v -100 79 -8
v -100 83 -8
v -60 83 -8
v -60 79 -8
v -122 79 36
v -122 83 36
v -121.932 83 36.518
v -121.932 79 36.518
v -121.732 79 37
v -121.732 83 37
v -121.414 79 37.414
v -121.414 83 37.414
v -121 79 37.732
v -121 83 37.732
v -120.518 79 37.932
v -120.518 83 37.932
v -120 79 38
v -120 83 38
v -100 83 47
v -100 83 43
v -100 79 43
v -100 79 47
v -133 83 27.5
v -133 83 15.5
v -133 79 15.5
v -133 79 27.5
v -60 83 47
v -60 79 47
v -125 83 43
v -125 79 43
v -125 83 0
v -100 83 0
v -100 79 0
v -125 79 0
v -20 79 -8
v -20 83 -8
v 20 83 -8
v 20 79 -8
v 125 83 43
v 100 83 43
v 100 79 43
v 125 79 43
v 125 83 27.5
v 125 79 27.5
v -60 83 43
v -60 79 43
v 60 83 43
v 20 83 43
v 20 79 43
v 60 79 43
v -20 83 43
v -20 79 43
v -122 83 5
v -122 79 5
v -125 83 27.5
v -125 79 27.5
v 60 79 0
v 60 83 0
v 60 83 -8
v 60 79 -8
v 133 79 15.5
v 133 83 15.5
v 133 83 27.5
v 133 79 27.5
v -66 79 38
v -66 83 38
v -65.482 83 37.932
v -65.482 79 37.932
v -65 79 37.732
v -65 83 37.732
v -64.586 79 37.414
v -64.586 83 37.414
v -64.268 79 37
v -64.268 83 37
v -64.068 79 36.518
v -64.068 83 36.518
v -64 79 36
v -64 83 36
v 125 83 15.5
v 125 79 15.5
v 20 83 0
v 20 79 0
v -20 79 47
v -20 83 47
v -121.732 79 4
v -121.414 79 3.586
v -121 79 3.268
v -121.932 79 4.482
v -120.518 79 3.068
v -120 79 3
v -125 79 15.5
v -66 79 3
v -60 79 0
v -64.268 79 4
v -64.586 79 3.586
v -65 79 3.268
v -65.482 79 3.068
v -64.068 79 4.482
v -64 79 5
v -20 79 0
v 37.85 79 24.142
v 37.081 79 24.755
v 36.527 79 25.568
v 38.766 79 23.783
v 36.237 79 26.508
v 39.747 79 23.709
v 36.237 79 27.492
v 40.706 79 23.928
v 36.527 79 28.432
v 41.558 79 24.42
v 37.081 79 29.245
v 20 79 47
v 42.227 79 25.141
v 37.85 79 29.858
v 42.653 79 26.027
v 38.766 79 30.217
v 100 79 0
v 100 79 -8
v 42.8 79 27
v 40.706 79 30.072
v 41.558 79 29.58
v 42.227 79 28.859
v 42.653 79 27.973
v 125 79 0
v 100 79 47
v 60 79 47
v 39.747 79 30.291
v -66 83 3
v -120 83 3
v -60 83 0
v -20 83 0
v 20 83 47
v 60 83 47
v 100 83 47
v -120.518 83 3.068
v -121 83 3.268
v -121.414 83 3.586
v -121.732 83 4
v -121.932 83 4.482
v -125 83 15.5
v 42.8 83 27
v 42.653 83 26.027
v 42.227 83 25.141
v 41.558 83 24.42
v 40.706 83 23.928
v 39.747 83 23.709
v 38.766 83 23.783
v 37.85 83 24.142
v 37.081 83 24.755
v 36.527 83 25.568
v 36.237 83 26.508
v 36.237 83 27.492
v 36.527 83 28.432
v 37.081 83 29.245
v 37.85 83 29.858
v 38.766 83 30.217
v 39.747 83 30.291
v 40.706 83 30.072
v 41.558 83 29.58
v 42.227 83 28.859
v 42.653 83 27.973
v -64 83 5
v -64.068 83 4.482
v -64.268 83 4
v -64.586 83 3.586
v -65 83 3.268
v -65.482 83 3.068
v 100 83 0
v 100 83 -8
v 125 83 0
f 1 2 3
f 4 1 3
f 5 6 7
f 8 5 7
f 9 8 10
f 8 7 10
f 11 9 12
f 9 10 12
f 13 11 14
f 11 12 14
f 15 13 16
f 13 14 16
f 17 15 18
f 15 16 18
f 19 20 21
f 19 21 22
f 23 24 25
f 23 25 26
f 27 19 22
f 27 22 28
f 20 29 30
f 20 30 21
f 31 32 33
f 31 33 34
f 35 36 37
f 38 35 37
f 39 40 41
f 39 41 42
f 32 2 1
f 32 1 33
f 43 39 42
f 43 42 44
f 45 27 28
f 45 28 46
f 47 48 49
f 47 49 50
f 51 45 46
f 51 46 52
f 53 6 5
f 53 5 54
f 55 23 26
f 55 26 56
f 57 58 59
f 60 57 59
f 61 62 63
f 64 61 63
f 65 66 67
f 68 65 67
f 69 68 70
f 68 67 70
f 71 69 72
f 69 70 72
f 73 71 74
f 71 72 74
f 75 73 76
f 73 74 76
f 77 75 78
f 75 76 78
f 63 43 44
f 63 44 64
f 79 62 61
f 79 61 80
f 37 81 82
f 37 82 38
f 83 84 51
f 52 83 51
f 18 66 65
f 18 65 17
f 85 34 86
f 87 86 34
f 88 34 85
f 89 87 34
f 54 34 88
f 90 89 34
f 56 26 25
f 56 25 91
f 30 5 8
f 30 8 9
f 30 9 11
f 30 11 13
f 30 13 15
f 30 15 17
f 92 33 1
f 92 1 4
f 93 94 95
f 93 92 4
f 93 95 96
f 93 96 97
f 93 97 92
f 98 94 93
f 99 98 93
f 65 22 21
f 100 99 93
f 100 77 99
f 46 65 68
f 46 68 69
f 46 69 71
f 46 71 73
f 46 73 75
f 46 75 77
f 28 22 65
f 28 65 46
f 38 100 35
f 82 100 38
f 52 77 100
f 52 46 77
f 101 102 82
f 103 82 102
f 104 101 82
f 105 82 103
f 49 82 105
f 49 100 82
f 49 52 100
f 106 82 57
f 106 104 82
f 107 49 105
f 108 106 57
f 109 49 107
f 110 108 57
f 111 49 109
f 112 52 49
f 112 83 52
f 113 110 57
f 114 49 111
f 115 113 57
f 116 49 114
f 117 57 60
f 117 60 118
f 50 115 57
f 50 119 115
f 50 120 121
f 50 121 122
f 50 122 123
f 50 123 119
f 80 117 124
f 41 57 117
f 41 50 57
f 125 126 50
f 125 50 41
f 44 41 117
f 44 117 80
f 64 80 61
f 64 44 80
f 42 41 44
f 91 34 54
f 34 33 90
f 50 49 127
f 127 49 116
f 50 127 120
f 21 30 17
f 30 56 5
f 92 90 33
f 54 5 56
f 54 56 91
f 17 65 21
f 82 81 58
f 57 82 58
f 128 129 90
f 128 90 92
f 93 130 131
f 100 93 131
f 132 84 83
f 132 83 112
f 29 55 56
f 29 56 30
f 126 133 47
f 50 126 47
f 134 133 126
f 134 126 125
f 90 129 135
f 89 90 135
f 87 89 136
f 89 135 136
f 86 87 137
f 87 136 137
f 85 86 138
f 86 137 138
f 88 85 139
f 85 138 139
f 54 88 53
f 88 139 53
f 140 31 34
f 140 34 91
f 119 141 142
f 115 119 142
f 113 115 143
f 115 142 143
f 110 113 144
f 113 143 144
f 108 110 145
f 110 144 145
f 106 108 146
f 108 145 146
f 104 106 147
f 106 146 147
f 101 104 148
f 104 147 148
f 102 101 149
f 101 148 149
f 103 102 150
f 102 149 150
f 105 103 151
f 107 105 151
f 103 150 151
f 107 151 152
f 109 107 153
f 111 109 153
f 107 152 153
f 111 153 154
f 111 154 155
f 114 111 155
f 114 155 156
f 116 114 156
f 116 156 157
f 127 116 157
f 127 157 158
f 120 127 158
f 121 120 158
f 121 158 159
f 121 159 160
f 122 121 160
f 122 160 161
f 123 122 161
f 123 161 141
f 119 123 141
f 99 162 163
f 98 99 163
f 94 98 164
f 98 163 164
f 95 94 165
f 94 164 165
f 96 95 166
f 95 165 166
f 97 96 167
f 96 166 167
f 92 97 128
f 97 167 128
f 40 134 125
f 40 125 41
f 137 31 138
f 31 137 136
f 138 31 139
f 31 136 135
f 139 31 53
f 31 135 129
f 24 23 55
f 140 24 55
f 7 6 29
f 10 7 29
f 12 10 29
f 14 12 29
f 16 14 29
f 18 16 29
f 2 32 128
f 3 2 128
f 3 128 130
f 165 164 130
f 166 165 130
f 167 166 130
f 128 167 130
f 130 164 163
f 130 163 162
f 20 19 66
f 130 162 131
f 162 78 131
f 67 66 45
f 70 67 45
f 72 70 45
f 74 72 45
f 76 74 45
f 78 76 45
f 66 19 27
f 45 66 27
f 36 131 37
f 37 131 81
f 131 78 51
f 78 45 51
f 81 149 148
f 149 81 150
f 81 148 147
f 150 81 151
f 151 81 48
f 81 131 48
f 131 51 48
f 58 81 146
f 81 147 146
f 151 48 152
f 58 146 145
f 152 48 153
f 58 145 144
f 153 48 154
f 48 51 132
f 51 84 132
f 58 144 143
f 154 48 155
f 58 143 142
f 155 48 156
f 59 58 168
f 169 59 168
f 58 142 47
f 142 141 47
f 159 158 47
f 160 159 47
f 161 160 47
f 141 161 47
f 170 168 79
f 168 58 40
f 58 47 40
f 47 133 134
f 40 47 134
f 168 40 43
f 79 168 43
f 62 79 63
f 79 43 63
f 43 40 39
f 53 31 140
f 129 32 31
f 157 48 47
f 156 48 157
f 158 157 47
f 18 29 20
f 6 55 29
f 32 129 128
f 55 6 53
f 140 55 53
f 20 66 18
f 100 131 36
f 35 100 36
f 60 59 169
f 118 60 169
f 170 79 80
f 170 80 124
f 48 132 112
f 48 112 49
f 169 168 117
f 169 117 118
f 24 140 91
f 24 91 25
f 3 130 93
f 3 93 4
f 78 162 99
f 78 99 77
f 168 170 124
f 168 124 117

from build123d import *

# Parameters (mm, degrees)
SKETCH005_W     = 266
SKETCH005_H     = 55
PAD002_DEPTH    = 4
SKETCH023_W     = 40
SKETCH023_H     = 30
POCKET006_DEPTH = 4.001
POCKET013_DEPTH = 4.001
SKETCH039_R     = 3.3
HOLE004_DEPTH   = 4.001


with BuildPart() as part:
    # Sketch005 (on DatumPlane) → Pad002 (new body)
    with BuildSketch(Plane.XZ.offset(-83)):
        with Locations((0, 19.5)):
            Rectangle(SKETCH005_W, SKETCH005_H)
    extrude(amount=PAD002_DEPTH)

    # Sketch023 (on Face5 of Pad002) → Pocket006 (cut, through all)
    with BuildSketch(Plane(origin=(0, 83, 0), x_dir=(1, 0, 0), z_dir=(0, 1, 0))):
        Polygon((-145, 30), (-100, 30), (-100, 0), (-125, 0), (-125, -15.5), (-155, -15.5), (-155, 4.5), (-145, 4.5), align=None)
        with Locations((-40, 15)):
            Rectangle(SKETCH023_W, SKETCH023_H)
        with Locations((40, 15)):
            Rectangle(SKETCH023_W, SKETCH023_H)
        Polygon((100, 30), (145, 30), (145, 4.5), (155, 4.5), (155, -15.5), (125, -15.5), (125, 0), (100, 0), align=None)
        Polygon((-125, -43), (-100, -43), (-100, -73), (-145, -73), (-145, -47.5), (-155, -47.5), (-155, -27.5), (-125, -27.5), align=None)
        with Locations((-40, -58)):
            Rectangle(SKETCH023_W, SKETCH023_H)
        with Locations((40, -58)):
            Rectangle(SKETCH023_W, SKETCH023_H)
        Polygon((100, -43), (125, -43), (125, -27.5), (155, -27.5), (155, -47.5), (145, -47.5), (145, -73), (100, -73), align=None)
    extrude(amount=-POCKET006_DEPTH, mode=Mode.SUBTRACT)

    # Sketch030 (on Face2 of Pocket006) → Pocket013 (cut, through all)
    with BuildSketch(Plane(origin=(0, 83, 0), x_dir=(1, 0, 0), z_dir=(0, 1, 0))):
        with BuildLine():
            Line((-120, -3), (-66, -3))
            ThreePointArc((-64, -5), (-64.585786, -3.585786), (-66, -3))
            Line((-64, -5), (-64, -36))
            ThreePointArc((-66, -38), (-64.585786, -37.414214), (-64, -36))
            Line((-66, -38), (-120, -38))
            ThreePointArc((-122, -36), (-121.414214, -37.414214), (-120, -38))
            Line((-122, -36), (-122, -5))
            ThreePointArc((-120, -3), (-121.414214, -3.585786), (-122, -5))
        make_face()
    extrude(amount=-POCKET013_DEPTH, mode=Mode.SUBTRACT)

    # Sketch039 (on Face2 of Pocket013) → Hole004 (cut, through all)
    with BuildSketch(Plane(origin=(0, 83, 0), x_dir=(1, 0, 0), z_dir=(0, 1, 0))):
        with Locations((39.5, -27)):
            Circle(SKETCH039_R)
    extrude(amount=-HOLE004_DEPTH, mode=Mode.SUBTRACT)


solid = part.part
